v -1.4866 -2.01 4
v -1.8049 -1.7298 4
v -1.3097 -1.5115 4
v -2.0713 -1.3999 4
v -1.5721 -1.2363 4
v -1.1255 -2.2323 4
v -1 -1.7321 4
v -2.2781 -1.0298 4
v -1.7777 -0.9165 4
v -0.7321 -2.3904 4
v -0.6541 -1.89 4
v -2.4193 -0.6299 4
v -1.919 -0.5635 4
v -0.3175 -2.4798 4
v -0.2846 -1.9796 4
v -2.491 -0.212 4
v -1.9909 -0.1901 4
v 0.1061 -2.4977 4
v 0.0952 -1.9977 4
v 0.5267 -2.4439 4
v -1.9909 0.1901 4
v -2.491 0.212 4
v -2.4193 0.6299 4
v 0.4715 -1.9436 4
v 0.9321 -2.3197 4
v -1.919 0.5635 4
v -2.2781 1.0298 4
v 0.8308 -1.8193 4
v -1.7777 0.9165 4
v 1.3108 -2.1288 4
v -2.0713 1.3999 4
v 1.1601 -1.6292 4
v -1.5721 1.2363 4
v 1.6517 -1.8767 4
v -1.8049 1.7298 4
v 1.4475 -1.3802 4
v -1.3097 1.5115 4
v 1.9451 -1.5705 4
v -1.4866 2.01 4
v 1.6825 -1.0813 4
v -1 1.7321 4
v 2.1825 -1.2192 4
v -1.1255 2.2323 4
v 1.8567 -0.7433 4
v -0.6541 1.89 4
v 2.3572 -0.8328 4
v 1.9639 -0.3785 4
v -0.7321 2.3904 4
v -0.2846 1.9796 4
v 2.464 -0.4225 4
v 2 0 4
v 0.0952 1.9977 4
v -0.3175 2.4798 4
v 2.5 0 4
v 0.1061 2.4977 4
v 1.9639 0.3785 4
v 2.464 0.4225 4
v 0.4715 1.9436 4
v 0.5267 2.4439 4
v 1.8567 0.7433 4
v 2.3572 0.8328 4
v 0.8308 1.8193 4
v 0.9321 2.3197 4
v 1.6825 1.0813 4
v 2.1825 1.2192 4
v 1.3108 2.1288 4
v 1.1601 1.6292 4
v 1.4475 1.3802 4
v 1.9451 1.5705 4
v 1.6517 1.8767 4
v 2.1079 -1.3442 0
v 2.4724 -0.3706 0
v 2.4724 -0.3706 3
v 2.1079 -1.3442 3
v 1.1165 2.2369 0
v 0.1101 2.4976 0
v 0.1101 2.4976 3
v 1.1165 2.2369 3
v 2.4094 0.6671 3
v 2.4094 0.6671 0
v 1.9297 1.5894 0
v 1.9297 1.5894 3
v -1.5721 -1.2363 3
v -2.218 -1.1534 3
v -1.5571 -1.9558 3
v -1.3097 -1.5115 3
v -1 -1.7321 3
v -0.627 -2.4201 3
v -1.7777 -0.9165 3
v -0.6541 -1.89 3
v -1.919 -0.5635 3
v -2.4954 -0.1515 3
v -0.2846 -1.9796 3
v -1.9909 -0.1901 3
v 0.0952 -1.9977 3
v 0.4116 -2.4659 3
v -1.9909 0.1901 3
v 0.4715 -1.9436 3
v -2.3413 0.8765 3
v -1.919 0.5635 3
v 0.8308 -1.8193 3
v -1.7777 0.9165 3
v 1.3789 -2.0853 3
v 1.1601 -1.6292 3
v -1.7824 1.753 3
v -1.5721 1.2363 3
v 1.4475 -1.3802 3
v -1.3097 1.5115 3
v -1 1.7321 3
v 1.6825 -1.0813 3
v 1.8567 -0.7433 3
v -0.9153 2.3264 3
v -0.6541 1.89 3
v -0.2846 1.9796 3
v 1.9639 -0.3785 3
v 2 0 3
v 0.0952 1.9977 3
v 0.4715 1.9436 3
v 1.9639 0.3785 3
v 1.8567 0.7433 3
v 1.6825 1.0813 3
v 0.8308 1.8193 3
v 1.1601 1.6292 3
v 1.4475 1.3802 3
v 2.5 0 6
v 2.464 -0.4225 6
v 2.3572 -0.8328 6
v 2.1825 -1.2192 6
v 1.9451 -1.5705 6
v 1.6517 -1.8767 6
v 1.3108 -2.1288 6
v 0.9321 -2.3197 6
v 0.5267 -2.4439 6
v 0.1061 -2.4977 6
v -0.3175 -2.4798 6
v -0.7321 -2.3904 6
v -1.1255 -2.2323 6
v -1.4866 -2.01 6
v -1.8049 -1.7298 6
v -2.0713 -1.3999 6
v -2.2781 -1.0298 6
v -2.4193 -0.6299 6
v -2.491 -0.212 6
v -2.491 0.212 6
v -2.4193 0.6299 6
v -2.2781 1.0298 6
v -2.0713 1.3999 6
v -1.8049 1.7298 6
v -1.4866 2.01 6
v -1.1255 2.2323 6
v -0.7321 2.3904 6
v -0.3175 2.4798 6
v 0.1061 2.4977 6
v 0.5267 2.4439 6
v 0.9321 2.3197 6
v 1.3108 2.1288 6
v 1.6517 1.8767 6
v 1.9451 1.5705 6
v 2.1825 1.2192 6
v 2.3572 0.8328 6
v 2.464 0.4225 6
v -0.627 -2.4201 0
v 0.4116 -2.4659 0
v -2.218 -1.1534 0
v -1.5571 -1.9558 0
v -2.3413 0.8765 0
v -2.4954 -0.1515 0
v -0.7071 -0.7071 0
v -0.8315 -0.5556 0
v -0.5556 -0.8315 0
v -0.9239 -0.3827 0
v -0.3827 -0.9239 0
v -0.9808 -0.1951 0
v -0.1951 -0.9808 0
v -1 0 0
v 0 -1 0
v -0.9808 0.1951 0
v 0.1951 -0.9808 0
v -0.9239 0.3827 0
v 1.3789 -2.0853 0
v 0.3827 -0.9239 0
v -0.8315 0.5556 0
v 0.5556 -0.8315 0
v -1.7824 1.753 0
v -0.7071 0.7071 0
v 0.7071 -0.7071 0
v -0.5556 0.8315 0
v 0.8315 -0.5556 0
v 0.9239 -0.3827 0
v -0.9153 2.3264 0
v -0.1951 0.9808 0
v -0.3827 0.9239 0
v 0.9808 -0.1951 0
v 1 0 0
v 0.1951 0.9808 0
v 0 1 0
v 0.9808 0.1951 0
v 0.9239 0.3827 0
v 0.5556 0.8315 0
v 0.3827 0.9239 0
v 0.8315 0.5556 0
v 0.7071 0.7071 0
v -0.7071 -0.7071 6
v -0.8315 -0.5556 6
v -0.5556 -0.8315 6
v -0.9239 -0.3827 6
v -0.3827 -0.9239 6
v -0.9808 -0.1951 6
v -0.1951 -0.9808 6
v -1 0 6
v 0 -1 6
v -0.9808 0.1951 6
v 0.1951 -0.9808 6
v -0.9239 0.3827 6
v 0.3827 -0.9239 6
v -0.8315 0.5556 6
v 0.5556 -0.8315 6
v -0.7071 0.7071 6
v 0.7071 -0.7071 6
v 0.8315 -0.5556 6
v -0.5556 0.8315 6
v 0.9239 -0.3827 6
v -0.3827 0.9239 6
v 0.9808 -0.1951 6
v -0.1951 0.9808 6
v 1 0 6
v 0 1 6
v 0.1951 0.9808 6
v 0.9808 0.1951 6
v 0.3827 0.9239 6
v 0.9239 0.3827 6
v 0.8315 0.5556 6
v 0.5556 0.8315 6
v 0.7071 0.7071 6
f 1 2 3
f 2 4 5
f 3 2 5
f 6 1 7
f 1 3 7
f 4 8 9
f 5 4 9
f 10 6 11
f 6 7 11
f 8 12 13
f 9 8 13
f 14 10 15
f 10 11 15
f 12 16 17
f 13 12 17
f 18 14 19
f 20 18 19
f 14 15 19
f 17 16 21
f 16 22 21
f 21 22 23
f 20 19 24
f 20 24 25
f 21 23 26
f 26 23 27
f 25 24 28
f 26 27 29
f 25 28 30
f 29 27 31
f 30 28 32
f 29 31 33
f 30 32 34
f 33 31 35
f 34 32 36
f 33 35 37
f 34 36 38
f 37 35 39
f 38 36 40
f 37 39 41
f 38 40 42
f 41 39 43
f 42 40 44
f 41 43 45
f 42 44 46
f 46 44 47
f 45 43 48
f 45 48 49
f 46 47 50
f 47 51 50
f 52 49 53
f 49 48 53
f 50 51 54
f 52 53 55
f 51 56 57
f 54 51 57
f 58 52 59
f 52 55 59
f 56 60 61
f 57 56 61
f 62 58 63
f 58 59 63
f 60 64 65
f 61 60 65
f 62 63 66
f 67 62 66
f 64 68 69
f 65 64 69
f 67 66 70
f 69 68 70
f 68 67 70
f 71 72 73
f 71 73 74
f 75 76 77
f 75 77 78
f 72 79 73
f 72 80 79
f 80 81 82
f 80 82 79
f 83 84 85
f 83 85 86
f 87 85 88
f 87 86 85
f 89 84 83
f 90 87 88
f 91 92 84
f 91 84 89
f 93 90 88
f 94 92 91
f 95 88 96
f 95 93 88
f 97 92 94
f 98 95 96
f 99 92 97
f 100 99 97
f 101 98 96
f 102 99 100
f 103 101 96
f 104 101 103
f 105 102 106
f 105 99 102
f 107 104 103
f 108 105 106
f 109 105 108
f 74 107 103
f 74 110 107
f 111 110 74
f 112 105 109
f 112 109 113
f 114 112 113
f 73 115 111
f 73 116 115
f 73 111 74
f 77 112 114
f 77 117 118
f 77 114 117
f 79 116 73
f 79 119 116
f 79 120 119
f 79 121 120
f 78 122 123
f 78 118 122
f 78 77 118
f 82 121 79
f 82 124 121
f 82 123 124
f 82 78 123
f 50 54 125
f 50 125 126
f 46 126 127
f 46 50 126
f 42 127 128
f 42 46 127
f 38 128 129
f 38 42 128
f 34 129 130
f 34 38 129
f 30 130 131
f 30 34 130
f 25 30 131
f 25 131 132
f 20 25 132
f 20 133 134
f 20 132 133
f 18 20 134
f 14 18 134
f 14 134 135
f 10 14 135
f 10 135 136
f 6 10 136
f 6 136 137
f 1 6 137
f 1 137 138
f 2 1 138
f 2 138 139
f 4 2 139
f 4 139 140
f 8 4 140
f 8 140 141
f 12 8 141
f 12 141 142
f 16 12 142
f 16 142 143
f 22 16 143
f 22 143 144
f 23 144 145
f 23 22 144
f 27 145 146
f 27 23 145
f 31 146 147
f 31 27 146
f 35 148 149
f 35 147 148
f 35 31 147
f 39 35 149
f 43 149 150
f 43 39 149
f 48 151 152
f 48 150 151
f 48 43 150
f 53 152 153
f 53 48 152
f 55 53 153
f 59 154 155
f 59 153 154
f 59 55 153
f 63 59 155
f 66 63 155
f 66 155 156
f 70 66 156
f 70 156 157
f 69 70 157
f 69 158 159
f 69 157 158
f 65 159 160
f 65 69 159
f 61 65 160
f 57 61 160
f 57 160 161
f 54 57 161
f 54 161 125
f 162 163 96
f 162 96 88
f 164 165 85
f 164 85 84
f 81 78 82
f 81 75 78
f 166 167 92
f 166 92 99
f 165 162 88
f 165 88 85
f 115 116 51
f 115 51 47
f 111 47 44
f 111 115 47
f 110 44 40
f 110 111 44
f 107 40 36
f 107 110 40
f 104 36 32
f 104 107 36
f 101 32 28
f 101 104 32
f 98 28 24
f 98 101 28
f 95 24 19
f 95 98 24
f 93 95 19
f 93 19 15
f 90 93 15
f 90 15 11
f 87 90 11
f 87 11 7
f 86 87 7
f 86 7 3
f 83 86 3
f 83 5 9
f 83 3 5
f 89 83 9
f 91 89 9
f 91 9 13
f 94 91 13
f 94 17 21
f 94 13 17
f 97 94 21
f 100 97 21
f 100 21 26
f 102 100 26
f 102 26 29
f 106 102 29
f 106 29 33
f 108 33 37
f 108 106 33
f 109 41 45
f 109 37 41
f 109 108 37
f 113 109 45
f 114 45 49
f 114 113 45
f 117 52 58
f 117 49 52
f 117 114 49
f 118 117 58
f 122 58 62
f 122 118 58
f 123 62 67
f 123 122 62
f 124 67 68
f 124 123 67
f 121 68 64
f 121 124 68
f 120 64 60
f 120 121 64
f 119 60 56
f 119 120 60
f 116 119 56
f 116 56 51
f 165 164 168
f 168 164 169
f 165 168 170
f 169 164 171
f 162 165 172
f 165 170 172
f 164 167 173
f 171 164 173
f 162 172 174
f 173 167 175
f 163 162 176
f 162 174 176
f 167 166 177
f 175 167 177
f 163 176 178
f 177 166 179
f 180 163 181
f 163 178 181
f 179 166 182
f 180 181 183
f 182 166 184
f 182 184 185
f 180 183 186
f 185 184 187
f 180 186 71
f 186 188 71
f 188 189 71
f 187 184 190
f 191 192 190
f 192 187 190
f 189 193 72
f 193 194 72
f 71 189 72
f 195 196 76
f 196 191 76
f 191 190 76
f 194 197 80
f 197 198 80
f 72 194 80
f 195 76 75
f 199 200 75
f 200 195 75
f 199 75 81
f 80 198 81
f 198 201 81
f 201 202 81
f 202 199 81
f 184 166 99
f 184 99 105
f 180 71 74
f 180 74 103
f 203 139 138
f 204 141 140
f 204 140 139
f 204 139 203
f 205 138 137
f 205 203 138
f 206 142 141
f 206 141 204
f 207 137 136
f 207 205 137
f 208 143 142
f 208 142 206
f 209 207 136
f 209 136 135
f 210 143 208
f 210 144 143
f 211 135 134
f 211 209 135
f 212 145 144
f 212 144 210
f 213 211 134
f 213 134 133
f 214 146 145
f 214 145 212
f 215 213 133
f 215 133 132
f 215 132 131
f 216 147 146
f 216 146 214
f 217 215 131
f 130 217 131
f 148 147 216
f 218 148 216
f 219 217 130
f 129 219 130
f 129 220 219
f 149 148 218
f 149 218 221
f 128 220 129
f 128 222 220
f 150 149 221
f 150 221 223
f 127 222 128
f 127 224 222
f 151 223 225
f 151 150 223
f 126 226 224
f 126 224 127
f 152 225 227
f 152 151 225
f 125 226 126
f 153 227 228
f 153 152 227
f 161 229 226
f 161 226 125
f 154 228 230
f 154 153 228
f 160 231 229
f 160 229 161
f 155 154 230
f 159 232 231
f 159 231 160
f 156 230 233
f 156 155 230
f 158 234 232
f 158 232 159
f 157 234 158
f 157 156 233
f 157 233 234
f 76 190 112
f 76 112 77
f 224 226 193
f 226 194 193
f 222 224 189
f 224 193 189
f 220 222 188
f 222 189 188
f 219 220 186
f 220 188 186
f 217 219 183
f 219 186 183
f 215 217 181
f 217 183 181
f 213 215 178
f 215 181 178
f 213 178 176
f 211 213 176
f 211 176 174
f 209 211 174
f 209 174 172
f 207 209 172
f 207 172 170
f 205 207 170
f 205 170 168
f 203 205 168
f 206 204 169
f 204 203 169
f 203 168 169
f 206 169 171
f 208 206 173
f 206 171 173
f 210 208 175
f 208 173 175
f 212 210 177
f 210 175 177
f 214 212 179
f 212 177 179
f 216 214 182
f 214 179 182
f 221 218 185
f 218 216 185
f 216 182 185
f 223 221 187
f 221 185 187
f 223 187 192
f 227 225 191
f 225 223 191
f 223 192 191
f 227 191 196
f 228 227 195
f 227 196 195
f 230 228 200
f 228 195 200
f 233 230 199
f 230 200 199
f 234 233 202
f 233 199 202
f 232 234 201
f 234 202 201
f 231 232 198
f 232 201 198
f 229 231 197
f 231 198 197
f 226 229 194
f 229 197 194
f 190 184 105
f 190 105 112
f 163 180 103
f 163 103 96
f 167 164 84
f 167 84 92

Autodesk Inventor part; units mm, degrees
ref_plane "YZ Plane" through (0, 0, 0) normal (1, 0, 0) x (0, 1, 0)
ref_plane "XZ Plane" through (0, 0, 0) normal (0, 1, 0) x (-1, 0, 0)
ref_plane "XY Plane" through (0, 0, 0) normal (0, 0, 1) x (1, 0, 0)
sketch "Sketch1" plane through (0, 0, 0) normal (0, 0, 1) x (1, 0, 0)
  line L0 (2.4094, 0.6671) -> (2.4724, -0.3706)
  line L1 (2.4724, -0.3706) -> (2.1079, -1.3442)
  line L2 (2.1079, -1.3442) -> (1.3789, -2.0853)
  line L3 (1.3789, -2.0853) -> (0.4116, -2.4659)
  line L4 (0.4116, -2.4659) -> (-0.627, -2.4201)
  line L5 (-0.627, -2.4201) -> (-1.5571, -1.9558)
  line L6 (-1.5571, -1.9558) -> (-2.218, -1.1534)
  line L7 (-2.218, -1.1534) -> (-2.4954, -0.1515)
  line L8 (-2.4954, -0.1515) -> (-2.3413, 0.8765)
  line L9 (-2.3413, 0.8765) -> (-1.7824, 1.753)
  line L10 (-1.7824, 1.753) -> (-0.9153, 2.3264)
  line L11 (-0.9153, 2.3264) -> (0.1101, 2.4976)
  line L12 (0.1101, 2.4976) -> (1.1165, 2.2369)
  line L13 (1.1165, 2.2369) -> (1.9297, 1.5894)
  line L14 (1.9297, 1.5894) -> (2.4094, 0.6671)
  circle A0 centre (0, 0) radius 1
  dimension "d1" = 2
extrude "Extrusion1" add sketch "Sketch1" along normal blind 3
sketch "Sketch2" plane through (0, 0, 3) normal (0, 0, 1) x (1, 0, 0)
  circle A0 centre (0, 0) radius 1 projected
  line L0 (2.4724, -0.3706) -> (2.4094, 0.6671) projected
  line L1 (2.4094, 0.6671) -> (1.9297, 1.5894) projected
  line L2 (1.9297, 1.5894) -> (1.1165, 2.2369) projected
  line L3 (1.1165, 2.2369) -> (0.1101, 2.4976) projected
  line L4 (0.1101, 2.4976) -> (-0.9153, 2.3264) projected
  line L5 (-0.9153, 2.3264) -> (-1.7824, 1.753) projected
  line L6 (-1.7824, 1.753) -> (-2.3413, 0.8765) projected
  line L7 (-2.3413, 0.8765) -> (-2.4954, -0.1515) projected
  line L8 (-2.4954, -0.1515) -> (-2.218, -1.1534) projected
  line L9 (-2.218, -1.1534) -> (-1.5571, -1.9558) projected
  line L10 (-1.5571, -1.9558) -> (-0.627, -2.4201) projected
  line L11 (-0.627, -2.4201) -> (0.4116, -2.4659) projected
  line L12 (0.4116, -2.4659) -> (1.3789, -2.0853) projected
  line L13 (1.3789, -2.0853) -> (2.1079, -1.3442) projected
  line L14 (2.1079, -1.3442) -> (2.4724, -0.3706) projected
  circle A1 centre (0, 0) radius 2
  dimension "d4" = 4
extrude "Extrusion2" add sketch "Sketch2" along normal blind 1 contours A1
sketch "Sketch3" plane through (0, 0, 4) normal (0, 0, 1) x (1, 0, 0)
  circle A0 centre (0, 0) radius 1 projected
  circle A1 centre (0, 0) radius 2 projected
  circle A2 centre (0, 0) radius 2.5
  dimension "d7" = 5
extrude "Extrusion3" add sketch "Sketch3" along normal blind 2 contours A1 | A2
properties part number "servo 2"
